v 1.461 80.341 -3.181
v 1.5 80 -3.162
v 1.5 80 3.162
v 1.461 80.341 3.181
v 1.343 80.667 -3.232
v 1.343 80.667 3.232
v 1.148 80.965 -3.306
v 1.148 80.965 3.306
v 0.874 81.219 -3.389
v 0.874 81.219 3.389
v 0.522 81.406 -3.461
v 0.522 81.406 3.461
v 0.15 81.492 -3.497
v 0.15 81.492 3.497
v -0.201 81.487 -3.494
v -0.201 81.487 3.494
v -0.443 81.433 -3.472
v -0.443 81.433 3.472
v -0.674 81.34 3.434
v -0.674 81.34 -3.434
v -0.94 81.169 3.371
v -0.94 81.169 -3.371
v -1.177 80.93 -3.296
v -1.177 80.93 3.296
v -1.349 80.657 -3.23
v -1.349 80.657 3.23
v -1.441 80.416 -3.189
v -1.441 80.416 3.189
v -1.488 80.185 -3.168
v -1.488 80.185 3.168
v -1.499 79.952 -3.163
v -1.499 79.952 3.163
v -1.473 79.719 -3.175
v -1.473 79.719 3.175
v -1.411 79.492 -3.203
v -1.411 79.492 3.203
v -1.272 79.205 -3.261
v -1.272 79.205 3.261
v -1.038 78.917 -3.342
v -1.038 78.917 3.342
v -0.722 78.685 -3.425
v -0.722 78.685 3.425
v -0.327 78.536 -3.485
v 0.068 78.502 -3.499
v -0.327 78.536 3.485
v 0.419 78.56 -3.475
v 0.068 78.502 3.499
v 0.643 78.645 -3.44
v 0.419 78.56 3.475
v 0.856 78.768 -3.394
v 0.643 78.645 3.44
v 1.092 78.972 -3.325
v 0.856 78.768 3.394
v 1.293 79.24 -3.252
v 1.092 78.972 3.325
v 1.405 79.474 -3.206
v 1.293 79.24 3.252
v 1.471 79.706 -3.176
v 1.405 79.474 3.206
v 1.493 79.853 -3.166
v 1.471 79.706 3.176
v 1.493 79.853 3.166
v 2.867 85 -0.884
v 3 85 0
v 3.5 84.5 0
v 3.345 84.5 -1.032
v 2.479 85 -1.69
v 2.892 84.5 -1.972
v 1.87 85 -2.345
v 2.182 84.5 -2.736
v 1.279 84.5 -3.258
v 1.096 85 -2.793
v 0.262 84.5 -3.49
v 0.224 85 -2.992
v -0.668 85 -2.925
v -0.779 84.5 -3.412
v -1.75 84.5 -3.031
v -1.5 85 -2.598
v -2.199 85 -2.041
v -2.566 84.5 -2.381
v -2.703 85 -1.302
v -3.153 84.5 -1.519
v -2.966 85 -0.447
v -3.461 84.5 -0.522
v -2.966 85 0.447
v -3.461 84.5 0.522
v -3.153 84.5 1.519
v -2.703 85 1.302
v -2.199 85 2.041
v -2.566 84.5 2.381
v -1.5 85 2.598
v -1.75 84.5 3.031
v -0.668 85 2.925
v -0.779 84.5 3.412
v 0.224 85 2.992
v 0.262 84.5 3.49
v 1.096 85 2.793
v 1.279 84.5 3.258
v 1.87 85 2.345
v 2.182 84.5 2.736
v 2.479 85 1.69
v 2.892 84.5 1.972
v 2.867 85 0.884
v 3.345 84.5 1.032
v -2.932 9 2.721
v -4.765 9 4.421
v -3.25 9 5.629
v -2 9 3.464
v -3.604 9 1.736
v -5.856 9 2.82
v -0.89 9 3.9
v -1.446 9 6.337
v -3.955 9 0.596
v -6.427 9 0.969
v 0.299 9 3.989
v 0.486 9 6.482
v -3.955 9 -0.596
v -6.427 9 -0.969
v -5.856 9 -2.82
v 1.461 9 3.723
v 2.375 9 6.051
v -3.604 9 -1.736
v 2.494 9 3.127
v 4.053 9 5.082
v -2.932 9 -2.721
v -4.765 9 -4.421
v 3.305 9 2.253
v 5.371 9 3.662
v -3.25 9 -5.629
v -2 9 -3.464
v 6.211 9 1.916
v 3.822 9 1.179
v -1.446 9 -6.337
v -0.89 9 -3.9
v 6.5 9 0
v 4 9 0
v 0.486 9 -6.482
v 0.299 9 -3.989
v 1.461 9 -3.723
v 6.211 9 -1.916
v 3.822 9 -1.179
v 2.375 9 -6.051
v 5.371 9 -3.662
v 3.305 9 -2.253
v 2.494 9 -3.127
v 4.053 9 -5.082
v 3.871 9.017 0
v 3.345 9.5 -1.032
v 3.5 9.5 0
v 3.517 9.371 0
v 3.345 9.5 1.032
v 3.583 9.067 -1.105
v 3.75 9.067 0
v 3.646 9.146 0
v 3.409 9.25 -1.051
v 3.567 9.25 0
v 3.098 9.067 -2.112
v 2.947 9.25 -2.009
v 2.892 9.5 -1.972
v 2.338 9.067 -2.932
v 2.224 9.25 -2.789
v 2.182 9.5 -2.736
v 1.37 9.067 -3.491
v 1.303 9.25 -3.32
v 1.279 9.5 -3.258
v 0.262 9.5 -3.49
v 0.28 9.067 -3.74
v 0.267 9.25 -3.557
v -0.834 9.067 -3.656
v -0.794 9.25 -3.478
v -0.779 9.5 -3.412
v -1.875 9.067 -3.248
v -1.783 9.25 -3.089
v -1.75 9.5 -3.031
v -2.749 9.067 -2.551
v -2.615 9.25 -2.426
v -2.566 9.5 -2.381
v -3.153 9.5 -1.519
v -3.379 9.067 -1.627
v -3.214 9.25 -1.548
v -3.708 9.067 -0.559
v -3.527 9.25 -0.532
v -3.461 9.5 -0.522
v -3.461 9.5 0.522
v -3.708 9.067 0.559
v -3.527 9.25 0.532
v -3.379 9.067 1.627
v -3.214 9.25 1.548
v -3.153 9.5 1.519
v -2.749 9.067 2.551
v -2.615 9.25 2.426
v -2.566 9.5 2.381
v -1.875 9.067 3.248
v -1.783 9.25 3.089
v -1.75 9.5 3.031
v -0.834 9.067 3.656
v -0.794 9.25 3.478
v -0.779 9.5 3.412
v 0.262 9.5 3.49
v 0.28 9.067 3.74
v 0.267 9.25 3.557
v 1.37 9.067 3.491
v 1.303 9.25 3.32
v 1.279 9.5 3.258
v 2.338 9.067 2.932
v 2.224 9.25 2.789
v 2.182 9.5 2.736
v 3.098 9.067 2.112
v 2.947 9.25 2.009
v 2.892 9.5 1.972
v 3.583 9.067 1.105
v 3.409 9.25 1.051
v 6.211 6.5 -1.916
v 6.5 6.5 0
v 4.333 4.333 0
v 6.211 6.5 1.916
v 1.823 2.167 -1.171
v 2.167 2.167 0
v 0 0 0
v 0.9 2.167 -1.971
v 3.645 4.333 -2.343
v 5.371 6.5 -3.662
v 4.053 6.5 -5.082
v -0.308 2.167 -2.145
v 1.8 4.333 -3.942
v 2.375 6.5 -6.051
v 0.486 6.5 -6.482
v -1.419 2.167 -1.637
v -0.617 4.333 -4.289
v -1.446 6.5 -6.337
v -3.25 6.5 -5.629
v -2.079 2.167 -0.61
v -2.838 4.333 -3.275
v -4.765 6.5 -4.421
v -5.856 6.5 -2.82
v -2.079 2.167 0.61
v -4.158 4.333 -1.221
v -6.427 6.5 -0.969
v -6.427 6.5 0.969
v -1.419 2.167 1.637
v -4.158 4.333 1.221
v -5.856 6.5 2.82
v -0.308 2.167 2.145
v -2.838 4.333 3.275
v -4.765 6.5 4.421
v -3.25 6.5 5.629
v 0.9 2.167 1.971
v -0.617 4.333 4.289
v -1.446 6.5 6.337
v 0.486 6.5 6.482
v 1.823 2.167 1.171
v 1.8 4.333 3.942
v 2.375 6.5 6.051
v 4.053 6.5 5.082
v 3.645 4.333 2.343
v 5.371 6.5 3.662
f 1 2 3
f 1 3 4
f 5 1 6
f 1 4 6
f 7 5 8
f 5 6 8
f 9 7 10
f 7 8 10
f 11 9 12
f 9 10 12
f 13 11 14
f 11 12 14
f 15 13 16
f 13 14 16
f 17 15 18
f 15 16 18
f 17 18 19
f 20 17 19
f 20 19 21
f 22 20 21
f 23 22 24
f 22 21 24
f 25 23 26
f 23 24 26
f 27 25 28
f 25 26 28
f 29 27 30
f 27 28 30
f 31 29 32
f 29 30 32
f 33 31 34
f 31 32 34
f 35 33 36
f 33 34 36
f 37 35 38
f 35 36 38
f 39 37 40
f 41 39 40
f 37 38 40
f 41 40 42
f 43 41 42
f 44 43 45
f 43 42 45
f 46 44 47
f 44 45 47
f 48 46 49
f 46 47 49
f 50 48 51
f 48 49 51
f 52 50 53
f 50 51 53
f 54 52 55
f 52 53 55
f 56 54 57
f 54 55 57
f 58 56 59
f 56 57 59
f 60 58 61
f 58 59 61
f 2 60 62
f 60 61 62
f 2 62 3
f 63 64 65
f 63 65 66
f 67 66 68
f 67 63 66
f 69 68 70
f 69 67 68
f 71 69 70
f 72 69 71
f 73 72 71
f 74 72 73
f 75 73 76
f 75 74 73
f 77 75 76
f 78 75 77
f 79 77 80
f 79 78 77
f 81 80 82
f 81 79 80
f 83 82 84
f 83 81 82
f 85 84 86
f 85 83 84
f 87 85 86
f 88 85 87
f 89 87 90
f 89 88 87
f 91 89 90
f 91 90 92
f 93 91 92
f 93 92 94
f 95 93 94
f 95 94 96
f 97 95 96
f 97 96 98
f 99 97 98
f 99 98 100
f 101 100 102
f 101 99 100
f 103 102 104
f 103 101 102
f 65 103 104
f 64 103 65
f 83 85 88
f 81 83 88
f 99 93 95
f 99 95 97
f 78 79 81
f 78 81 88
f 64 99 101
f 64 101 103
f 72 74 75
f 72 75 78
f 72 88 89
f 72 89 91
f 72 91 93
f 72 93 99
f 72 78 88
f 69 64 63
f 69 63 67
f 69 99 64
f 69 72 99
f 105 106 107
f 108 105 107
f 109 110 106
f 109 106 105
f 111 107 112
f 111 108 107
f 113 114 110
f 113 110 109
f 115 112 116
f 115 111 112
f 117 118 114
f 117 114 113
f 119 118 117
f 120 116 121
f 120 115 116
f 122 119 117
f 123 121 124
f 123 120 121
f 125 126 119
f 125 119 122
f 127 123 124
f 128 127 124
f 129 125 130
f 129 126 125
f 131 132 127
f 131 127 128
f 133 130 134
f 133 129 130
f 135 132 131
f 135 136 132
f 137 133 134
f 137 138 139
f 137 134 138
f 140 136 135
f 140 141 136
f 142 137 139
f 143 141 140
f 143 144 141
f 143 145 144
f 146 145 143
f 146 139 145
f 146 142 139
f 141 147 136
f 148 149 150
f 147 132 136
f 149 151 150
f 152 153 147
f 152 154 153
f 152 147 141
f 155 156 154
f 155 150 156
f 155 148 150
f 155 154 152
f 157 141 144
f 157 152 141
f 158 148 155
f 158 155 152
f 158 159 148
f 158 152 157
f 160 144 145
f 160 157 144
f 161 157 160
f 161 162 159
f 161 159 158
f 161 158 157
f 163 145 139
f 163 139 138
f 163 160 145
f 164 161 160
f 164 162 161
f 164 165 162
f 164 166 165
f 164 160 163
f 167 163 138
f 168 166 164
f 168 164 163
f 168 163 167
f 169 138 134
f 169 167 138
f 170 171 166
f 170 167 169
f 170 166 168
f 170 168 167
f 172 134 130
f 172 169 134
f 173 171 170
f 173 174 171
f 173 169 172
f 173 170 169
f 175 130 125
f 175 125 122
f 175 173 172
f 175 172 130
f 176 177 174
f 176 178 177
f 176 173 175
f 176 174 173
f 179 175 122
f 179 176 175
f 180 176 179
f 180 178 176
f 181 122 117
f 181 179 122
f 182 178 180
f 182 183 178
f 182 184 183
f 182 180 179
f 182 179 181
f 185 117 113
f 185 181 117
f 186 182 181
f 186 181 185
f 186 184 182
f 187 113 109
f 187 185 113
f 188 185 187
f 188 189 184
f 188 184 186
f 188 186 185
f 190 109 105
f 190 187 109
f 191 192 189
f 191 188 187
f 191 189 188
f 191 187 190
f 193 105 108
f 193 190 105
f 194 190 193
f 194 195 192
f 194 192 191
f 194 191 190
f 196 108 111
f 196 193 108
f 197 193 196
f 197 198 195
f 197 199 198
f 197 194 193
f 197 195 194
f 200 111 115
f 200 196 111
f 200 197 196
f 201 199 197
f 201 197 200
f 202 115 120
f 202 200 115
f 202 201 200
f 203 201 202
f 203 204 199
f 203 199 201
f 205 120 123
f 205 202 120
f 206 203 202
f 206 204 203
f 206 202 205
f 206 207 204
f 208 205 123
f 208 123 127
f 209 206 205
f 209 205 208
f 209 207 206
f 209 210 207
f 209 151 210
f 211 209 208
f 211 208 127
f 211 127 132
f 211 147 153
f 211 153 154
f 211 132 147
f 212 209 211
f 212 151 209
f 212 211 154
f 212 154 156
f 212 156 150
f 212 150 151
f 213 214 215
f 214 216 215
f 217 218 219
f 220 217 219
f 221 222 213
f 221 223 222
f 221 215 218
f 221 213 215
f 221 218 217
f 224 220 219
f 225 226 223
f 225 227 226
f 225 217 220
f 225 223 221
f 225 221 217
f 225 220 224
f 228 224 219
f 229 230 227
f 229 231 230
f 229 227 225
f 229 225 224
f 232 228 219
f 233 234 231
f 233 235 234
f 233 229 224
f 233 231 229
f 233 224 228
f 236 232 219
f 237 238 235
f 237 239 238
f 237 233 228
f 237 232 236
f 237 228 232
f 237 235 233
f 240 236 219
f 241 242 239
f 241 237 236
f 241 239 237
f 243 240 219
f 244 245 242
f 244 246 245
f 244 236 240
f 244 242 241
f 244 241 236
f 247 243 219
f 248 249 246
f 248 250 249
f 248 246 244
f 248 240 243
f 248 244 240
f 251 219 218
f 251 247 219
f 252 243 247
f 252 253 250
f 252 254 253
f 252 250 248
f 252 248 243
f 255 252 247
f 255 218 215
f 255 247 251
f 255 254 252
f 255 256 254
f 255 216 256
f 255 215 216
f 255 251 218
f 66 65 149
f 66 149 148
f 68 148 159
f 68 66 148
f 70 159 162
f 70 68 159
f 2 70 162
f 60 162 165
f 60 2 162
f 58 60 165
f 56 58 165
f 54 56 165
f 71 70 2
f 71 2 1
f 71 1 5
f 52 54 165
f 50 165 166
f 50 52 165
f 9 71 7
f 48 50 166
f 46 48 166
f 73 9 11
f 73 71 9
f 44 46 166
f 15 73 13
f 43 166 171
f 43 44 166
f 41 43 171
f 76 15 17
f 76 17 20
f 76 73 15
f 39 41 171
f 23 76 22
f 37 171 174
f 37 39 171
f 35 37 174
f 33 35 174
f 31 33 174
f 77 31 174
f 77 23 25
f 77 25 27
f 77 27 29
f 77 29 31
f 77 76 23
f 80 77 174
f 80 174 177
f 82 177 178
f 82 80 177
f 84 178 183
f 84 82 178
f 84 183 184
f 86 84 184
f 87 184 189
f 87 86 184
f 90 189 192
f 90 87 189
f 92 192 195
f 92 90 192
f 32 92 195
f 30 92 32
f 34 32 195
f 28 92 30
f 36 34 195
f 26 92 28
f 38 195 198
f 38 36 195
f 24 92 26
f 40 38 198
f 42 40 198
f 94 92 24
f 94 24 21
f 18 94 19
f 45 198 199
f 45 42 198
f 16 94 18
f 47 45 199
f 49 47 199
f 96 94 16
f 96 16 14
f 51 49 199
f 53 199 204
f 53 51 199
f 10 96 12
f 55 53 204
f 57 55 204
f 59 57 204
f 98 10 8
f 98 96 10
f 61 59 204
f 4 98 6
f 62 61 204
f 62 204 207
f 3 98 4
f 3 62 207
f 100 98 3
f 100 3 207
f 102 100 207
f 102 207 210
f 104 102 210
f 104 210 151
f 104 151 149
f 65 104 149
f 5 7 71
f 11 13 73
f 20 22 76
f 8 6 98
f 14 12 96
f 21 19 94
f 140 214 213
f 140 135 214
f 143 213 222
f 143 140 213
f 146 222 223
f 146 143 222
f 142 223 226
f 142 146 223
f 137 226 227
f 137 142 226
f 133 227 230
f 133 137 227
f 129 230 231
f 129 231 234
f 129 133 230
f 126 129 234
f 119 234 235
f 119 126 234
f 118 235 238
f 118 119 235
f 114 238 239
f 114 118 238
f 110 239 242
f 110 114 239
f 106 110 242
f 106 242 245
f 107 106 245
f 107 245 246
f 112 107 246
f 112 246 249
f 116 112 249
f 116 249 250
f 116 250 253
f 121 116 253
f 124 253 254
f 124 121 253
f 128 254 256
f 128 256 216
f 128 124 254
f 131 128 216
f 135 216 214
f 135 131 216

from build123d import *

# Parameters (mm, degrees)
SZKIC2_R                        = 1.5
WYTNIJ_WYCI_GNI_CIE1_DEPTH      = 7.5
WYTNIJ_WYCI_GNI_CIE1_DEPTH_BACK = 7.5
SFAZOWANIE4_SIZE                = 0.5


with BuildPart() as part:
    # Szkic1 → Obrót2 (revolve)
    with BuildSketch(Plane.XY):
        with BuildLine():
            Line((0, 0), (6.5, 6.5))
            Line((6.5, 6.5), (6.5, 9))
            Line((6.5, 9), (4, 9))
            ThreePointArc((4, 9), (3.646446609, 9.146446609), (3.5, 9.5))
            Line((3.5, 9.5), (3.5, 85))
            Line((3.5, 85), (0, 85))
            Line((0, 85), (0, 0))
        make_face()
    revolve(axis=Axis((0, 0, 0), (0, 1, 0)))

    # Szkic2 → Wytnij-wyciągnięcie1 (cut, two sides)
    with BuildSketch(Plane.XY) as wytnij_wyci_gni_cie1_sk:
        with Locations((0, 80)):
            Circle(SZKIC2_R)
    extrude(amount=WYTNIJ_WYCI_GNI_CIE1_DEPTH, mode=Mode.SUBTRACT)
    extrude(wytnij_wyci_gni_cie1_sk.sketch, amount=-WYTNIJ_WYCI_GNI_CIE1_DEPTH_BACK, mode=Mode.SUBTRACT)

    # Sfazowanie4
    sfazowanie4_edges = [part.edges().sort_by_distance(p)[0] for p in [
        (-3.5, 85, 0),
    ]]
    chamfer(sfazowanie4_edges, length=SFAZOWANIE4_SIZE)


solid = part.part
